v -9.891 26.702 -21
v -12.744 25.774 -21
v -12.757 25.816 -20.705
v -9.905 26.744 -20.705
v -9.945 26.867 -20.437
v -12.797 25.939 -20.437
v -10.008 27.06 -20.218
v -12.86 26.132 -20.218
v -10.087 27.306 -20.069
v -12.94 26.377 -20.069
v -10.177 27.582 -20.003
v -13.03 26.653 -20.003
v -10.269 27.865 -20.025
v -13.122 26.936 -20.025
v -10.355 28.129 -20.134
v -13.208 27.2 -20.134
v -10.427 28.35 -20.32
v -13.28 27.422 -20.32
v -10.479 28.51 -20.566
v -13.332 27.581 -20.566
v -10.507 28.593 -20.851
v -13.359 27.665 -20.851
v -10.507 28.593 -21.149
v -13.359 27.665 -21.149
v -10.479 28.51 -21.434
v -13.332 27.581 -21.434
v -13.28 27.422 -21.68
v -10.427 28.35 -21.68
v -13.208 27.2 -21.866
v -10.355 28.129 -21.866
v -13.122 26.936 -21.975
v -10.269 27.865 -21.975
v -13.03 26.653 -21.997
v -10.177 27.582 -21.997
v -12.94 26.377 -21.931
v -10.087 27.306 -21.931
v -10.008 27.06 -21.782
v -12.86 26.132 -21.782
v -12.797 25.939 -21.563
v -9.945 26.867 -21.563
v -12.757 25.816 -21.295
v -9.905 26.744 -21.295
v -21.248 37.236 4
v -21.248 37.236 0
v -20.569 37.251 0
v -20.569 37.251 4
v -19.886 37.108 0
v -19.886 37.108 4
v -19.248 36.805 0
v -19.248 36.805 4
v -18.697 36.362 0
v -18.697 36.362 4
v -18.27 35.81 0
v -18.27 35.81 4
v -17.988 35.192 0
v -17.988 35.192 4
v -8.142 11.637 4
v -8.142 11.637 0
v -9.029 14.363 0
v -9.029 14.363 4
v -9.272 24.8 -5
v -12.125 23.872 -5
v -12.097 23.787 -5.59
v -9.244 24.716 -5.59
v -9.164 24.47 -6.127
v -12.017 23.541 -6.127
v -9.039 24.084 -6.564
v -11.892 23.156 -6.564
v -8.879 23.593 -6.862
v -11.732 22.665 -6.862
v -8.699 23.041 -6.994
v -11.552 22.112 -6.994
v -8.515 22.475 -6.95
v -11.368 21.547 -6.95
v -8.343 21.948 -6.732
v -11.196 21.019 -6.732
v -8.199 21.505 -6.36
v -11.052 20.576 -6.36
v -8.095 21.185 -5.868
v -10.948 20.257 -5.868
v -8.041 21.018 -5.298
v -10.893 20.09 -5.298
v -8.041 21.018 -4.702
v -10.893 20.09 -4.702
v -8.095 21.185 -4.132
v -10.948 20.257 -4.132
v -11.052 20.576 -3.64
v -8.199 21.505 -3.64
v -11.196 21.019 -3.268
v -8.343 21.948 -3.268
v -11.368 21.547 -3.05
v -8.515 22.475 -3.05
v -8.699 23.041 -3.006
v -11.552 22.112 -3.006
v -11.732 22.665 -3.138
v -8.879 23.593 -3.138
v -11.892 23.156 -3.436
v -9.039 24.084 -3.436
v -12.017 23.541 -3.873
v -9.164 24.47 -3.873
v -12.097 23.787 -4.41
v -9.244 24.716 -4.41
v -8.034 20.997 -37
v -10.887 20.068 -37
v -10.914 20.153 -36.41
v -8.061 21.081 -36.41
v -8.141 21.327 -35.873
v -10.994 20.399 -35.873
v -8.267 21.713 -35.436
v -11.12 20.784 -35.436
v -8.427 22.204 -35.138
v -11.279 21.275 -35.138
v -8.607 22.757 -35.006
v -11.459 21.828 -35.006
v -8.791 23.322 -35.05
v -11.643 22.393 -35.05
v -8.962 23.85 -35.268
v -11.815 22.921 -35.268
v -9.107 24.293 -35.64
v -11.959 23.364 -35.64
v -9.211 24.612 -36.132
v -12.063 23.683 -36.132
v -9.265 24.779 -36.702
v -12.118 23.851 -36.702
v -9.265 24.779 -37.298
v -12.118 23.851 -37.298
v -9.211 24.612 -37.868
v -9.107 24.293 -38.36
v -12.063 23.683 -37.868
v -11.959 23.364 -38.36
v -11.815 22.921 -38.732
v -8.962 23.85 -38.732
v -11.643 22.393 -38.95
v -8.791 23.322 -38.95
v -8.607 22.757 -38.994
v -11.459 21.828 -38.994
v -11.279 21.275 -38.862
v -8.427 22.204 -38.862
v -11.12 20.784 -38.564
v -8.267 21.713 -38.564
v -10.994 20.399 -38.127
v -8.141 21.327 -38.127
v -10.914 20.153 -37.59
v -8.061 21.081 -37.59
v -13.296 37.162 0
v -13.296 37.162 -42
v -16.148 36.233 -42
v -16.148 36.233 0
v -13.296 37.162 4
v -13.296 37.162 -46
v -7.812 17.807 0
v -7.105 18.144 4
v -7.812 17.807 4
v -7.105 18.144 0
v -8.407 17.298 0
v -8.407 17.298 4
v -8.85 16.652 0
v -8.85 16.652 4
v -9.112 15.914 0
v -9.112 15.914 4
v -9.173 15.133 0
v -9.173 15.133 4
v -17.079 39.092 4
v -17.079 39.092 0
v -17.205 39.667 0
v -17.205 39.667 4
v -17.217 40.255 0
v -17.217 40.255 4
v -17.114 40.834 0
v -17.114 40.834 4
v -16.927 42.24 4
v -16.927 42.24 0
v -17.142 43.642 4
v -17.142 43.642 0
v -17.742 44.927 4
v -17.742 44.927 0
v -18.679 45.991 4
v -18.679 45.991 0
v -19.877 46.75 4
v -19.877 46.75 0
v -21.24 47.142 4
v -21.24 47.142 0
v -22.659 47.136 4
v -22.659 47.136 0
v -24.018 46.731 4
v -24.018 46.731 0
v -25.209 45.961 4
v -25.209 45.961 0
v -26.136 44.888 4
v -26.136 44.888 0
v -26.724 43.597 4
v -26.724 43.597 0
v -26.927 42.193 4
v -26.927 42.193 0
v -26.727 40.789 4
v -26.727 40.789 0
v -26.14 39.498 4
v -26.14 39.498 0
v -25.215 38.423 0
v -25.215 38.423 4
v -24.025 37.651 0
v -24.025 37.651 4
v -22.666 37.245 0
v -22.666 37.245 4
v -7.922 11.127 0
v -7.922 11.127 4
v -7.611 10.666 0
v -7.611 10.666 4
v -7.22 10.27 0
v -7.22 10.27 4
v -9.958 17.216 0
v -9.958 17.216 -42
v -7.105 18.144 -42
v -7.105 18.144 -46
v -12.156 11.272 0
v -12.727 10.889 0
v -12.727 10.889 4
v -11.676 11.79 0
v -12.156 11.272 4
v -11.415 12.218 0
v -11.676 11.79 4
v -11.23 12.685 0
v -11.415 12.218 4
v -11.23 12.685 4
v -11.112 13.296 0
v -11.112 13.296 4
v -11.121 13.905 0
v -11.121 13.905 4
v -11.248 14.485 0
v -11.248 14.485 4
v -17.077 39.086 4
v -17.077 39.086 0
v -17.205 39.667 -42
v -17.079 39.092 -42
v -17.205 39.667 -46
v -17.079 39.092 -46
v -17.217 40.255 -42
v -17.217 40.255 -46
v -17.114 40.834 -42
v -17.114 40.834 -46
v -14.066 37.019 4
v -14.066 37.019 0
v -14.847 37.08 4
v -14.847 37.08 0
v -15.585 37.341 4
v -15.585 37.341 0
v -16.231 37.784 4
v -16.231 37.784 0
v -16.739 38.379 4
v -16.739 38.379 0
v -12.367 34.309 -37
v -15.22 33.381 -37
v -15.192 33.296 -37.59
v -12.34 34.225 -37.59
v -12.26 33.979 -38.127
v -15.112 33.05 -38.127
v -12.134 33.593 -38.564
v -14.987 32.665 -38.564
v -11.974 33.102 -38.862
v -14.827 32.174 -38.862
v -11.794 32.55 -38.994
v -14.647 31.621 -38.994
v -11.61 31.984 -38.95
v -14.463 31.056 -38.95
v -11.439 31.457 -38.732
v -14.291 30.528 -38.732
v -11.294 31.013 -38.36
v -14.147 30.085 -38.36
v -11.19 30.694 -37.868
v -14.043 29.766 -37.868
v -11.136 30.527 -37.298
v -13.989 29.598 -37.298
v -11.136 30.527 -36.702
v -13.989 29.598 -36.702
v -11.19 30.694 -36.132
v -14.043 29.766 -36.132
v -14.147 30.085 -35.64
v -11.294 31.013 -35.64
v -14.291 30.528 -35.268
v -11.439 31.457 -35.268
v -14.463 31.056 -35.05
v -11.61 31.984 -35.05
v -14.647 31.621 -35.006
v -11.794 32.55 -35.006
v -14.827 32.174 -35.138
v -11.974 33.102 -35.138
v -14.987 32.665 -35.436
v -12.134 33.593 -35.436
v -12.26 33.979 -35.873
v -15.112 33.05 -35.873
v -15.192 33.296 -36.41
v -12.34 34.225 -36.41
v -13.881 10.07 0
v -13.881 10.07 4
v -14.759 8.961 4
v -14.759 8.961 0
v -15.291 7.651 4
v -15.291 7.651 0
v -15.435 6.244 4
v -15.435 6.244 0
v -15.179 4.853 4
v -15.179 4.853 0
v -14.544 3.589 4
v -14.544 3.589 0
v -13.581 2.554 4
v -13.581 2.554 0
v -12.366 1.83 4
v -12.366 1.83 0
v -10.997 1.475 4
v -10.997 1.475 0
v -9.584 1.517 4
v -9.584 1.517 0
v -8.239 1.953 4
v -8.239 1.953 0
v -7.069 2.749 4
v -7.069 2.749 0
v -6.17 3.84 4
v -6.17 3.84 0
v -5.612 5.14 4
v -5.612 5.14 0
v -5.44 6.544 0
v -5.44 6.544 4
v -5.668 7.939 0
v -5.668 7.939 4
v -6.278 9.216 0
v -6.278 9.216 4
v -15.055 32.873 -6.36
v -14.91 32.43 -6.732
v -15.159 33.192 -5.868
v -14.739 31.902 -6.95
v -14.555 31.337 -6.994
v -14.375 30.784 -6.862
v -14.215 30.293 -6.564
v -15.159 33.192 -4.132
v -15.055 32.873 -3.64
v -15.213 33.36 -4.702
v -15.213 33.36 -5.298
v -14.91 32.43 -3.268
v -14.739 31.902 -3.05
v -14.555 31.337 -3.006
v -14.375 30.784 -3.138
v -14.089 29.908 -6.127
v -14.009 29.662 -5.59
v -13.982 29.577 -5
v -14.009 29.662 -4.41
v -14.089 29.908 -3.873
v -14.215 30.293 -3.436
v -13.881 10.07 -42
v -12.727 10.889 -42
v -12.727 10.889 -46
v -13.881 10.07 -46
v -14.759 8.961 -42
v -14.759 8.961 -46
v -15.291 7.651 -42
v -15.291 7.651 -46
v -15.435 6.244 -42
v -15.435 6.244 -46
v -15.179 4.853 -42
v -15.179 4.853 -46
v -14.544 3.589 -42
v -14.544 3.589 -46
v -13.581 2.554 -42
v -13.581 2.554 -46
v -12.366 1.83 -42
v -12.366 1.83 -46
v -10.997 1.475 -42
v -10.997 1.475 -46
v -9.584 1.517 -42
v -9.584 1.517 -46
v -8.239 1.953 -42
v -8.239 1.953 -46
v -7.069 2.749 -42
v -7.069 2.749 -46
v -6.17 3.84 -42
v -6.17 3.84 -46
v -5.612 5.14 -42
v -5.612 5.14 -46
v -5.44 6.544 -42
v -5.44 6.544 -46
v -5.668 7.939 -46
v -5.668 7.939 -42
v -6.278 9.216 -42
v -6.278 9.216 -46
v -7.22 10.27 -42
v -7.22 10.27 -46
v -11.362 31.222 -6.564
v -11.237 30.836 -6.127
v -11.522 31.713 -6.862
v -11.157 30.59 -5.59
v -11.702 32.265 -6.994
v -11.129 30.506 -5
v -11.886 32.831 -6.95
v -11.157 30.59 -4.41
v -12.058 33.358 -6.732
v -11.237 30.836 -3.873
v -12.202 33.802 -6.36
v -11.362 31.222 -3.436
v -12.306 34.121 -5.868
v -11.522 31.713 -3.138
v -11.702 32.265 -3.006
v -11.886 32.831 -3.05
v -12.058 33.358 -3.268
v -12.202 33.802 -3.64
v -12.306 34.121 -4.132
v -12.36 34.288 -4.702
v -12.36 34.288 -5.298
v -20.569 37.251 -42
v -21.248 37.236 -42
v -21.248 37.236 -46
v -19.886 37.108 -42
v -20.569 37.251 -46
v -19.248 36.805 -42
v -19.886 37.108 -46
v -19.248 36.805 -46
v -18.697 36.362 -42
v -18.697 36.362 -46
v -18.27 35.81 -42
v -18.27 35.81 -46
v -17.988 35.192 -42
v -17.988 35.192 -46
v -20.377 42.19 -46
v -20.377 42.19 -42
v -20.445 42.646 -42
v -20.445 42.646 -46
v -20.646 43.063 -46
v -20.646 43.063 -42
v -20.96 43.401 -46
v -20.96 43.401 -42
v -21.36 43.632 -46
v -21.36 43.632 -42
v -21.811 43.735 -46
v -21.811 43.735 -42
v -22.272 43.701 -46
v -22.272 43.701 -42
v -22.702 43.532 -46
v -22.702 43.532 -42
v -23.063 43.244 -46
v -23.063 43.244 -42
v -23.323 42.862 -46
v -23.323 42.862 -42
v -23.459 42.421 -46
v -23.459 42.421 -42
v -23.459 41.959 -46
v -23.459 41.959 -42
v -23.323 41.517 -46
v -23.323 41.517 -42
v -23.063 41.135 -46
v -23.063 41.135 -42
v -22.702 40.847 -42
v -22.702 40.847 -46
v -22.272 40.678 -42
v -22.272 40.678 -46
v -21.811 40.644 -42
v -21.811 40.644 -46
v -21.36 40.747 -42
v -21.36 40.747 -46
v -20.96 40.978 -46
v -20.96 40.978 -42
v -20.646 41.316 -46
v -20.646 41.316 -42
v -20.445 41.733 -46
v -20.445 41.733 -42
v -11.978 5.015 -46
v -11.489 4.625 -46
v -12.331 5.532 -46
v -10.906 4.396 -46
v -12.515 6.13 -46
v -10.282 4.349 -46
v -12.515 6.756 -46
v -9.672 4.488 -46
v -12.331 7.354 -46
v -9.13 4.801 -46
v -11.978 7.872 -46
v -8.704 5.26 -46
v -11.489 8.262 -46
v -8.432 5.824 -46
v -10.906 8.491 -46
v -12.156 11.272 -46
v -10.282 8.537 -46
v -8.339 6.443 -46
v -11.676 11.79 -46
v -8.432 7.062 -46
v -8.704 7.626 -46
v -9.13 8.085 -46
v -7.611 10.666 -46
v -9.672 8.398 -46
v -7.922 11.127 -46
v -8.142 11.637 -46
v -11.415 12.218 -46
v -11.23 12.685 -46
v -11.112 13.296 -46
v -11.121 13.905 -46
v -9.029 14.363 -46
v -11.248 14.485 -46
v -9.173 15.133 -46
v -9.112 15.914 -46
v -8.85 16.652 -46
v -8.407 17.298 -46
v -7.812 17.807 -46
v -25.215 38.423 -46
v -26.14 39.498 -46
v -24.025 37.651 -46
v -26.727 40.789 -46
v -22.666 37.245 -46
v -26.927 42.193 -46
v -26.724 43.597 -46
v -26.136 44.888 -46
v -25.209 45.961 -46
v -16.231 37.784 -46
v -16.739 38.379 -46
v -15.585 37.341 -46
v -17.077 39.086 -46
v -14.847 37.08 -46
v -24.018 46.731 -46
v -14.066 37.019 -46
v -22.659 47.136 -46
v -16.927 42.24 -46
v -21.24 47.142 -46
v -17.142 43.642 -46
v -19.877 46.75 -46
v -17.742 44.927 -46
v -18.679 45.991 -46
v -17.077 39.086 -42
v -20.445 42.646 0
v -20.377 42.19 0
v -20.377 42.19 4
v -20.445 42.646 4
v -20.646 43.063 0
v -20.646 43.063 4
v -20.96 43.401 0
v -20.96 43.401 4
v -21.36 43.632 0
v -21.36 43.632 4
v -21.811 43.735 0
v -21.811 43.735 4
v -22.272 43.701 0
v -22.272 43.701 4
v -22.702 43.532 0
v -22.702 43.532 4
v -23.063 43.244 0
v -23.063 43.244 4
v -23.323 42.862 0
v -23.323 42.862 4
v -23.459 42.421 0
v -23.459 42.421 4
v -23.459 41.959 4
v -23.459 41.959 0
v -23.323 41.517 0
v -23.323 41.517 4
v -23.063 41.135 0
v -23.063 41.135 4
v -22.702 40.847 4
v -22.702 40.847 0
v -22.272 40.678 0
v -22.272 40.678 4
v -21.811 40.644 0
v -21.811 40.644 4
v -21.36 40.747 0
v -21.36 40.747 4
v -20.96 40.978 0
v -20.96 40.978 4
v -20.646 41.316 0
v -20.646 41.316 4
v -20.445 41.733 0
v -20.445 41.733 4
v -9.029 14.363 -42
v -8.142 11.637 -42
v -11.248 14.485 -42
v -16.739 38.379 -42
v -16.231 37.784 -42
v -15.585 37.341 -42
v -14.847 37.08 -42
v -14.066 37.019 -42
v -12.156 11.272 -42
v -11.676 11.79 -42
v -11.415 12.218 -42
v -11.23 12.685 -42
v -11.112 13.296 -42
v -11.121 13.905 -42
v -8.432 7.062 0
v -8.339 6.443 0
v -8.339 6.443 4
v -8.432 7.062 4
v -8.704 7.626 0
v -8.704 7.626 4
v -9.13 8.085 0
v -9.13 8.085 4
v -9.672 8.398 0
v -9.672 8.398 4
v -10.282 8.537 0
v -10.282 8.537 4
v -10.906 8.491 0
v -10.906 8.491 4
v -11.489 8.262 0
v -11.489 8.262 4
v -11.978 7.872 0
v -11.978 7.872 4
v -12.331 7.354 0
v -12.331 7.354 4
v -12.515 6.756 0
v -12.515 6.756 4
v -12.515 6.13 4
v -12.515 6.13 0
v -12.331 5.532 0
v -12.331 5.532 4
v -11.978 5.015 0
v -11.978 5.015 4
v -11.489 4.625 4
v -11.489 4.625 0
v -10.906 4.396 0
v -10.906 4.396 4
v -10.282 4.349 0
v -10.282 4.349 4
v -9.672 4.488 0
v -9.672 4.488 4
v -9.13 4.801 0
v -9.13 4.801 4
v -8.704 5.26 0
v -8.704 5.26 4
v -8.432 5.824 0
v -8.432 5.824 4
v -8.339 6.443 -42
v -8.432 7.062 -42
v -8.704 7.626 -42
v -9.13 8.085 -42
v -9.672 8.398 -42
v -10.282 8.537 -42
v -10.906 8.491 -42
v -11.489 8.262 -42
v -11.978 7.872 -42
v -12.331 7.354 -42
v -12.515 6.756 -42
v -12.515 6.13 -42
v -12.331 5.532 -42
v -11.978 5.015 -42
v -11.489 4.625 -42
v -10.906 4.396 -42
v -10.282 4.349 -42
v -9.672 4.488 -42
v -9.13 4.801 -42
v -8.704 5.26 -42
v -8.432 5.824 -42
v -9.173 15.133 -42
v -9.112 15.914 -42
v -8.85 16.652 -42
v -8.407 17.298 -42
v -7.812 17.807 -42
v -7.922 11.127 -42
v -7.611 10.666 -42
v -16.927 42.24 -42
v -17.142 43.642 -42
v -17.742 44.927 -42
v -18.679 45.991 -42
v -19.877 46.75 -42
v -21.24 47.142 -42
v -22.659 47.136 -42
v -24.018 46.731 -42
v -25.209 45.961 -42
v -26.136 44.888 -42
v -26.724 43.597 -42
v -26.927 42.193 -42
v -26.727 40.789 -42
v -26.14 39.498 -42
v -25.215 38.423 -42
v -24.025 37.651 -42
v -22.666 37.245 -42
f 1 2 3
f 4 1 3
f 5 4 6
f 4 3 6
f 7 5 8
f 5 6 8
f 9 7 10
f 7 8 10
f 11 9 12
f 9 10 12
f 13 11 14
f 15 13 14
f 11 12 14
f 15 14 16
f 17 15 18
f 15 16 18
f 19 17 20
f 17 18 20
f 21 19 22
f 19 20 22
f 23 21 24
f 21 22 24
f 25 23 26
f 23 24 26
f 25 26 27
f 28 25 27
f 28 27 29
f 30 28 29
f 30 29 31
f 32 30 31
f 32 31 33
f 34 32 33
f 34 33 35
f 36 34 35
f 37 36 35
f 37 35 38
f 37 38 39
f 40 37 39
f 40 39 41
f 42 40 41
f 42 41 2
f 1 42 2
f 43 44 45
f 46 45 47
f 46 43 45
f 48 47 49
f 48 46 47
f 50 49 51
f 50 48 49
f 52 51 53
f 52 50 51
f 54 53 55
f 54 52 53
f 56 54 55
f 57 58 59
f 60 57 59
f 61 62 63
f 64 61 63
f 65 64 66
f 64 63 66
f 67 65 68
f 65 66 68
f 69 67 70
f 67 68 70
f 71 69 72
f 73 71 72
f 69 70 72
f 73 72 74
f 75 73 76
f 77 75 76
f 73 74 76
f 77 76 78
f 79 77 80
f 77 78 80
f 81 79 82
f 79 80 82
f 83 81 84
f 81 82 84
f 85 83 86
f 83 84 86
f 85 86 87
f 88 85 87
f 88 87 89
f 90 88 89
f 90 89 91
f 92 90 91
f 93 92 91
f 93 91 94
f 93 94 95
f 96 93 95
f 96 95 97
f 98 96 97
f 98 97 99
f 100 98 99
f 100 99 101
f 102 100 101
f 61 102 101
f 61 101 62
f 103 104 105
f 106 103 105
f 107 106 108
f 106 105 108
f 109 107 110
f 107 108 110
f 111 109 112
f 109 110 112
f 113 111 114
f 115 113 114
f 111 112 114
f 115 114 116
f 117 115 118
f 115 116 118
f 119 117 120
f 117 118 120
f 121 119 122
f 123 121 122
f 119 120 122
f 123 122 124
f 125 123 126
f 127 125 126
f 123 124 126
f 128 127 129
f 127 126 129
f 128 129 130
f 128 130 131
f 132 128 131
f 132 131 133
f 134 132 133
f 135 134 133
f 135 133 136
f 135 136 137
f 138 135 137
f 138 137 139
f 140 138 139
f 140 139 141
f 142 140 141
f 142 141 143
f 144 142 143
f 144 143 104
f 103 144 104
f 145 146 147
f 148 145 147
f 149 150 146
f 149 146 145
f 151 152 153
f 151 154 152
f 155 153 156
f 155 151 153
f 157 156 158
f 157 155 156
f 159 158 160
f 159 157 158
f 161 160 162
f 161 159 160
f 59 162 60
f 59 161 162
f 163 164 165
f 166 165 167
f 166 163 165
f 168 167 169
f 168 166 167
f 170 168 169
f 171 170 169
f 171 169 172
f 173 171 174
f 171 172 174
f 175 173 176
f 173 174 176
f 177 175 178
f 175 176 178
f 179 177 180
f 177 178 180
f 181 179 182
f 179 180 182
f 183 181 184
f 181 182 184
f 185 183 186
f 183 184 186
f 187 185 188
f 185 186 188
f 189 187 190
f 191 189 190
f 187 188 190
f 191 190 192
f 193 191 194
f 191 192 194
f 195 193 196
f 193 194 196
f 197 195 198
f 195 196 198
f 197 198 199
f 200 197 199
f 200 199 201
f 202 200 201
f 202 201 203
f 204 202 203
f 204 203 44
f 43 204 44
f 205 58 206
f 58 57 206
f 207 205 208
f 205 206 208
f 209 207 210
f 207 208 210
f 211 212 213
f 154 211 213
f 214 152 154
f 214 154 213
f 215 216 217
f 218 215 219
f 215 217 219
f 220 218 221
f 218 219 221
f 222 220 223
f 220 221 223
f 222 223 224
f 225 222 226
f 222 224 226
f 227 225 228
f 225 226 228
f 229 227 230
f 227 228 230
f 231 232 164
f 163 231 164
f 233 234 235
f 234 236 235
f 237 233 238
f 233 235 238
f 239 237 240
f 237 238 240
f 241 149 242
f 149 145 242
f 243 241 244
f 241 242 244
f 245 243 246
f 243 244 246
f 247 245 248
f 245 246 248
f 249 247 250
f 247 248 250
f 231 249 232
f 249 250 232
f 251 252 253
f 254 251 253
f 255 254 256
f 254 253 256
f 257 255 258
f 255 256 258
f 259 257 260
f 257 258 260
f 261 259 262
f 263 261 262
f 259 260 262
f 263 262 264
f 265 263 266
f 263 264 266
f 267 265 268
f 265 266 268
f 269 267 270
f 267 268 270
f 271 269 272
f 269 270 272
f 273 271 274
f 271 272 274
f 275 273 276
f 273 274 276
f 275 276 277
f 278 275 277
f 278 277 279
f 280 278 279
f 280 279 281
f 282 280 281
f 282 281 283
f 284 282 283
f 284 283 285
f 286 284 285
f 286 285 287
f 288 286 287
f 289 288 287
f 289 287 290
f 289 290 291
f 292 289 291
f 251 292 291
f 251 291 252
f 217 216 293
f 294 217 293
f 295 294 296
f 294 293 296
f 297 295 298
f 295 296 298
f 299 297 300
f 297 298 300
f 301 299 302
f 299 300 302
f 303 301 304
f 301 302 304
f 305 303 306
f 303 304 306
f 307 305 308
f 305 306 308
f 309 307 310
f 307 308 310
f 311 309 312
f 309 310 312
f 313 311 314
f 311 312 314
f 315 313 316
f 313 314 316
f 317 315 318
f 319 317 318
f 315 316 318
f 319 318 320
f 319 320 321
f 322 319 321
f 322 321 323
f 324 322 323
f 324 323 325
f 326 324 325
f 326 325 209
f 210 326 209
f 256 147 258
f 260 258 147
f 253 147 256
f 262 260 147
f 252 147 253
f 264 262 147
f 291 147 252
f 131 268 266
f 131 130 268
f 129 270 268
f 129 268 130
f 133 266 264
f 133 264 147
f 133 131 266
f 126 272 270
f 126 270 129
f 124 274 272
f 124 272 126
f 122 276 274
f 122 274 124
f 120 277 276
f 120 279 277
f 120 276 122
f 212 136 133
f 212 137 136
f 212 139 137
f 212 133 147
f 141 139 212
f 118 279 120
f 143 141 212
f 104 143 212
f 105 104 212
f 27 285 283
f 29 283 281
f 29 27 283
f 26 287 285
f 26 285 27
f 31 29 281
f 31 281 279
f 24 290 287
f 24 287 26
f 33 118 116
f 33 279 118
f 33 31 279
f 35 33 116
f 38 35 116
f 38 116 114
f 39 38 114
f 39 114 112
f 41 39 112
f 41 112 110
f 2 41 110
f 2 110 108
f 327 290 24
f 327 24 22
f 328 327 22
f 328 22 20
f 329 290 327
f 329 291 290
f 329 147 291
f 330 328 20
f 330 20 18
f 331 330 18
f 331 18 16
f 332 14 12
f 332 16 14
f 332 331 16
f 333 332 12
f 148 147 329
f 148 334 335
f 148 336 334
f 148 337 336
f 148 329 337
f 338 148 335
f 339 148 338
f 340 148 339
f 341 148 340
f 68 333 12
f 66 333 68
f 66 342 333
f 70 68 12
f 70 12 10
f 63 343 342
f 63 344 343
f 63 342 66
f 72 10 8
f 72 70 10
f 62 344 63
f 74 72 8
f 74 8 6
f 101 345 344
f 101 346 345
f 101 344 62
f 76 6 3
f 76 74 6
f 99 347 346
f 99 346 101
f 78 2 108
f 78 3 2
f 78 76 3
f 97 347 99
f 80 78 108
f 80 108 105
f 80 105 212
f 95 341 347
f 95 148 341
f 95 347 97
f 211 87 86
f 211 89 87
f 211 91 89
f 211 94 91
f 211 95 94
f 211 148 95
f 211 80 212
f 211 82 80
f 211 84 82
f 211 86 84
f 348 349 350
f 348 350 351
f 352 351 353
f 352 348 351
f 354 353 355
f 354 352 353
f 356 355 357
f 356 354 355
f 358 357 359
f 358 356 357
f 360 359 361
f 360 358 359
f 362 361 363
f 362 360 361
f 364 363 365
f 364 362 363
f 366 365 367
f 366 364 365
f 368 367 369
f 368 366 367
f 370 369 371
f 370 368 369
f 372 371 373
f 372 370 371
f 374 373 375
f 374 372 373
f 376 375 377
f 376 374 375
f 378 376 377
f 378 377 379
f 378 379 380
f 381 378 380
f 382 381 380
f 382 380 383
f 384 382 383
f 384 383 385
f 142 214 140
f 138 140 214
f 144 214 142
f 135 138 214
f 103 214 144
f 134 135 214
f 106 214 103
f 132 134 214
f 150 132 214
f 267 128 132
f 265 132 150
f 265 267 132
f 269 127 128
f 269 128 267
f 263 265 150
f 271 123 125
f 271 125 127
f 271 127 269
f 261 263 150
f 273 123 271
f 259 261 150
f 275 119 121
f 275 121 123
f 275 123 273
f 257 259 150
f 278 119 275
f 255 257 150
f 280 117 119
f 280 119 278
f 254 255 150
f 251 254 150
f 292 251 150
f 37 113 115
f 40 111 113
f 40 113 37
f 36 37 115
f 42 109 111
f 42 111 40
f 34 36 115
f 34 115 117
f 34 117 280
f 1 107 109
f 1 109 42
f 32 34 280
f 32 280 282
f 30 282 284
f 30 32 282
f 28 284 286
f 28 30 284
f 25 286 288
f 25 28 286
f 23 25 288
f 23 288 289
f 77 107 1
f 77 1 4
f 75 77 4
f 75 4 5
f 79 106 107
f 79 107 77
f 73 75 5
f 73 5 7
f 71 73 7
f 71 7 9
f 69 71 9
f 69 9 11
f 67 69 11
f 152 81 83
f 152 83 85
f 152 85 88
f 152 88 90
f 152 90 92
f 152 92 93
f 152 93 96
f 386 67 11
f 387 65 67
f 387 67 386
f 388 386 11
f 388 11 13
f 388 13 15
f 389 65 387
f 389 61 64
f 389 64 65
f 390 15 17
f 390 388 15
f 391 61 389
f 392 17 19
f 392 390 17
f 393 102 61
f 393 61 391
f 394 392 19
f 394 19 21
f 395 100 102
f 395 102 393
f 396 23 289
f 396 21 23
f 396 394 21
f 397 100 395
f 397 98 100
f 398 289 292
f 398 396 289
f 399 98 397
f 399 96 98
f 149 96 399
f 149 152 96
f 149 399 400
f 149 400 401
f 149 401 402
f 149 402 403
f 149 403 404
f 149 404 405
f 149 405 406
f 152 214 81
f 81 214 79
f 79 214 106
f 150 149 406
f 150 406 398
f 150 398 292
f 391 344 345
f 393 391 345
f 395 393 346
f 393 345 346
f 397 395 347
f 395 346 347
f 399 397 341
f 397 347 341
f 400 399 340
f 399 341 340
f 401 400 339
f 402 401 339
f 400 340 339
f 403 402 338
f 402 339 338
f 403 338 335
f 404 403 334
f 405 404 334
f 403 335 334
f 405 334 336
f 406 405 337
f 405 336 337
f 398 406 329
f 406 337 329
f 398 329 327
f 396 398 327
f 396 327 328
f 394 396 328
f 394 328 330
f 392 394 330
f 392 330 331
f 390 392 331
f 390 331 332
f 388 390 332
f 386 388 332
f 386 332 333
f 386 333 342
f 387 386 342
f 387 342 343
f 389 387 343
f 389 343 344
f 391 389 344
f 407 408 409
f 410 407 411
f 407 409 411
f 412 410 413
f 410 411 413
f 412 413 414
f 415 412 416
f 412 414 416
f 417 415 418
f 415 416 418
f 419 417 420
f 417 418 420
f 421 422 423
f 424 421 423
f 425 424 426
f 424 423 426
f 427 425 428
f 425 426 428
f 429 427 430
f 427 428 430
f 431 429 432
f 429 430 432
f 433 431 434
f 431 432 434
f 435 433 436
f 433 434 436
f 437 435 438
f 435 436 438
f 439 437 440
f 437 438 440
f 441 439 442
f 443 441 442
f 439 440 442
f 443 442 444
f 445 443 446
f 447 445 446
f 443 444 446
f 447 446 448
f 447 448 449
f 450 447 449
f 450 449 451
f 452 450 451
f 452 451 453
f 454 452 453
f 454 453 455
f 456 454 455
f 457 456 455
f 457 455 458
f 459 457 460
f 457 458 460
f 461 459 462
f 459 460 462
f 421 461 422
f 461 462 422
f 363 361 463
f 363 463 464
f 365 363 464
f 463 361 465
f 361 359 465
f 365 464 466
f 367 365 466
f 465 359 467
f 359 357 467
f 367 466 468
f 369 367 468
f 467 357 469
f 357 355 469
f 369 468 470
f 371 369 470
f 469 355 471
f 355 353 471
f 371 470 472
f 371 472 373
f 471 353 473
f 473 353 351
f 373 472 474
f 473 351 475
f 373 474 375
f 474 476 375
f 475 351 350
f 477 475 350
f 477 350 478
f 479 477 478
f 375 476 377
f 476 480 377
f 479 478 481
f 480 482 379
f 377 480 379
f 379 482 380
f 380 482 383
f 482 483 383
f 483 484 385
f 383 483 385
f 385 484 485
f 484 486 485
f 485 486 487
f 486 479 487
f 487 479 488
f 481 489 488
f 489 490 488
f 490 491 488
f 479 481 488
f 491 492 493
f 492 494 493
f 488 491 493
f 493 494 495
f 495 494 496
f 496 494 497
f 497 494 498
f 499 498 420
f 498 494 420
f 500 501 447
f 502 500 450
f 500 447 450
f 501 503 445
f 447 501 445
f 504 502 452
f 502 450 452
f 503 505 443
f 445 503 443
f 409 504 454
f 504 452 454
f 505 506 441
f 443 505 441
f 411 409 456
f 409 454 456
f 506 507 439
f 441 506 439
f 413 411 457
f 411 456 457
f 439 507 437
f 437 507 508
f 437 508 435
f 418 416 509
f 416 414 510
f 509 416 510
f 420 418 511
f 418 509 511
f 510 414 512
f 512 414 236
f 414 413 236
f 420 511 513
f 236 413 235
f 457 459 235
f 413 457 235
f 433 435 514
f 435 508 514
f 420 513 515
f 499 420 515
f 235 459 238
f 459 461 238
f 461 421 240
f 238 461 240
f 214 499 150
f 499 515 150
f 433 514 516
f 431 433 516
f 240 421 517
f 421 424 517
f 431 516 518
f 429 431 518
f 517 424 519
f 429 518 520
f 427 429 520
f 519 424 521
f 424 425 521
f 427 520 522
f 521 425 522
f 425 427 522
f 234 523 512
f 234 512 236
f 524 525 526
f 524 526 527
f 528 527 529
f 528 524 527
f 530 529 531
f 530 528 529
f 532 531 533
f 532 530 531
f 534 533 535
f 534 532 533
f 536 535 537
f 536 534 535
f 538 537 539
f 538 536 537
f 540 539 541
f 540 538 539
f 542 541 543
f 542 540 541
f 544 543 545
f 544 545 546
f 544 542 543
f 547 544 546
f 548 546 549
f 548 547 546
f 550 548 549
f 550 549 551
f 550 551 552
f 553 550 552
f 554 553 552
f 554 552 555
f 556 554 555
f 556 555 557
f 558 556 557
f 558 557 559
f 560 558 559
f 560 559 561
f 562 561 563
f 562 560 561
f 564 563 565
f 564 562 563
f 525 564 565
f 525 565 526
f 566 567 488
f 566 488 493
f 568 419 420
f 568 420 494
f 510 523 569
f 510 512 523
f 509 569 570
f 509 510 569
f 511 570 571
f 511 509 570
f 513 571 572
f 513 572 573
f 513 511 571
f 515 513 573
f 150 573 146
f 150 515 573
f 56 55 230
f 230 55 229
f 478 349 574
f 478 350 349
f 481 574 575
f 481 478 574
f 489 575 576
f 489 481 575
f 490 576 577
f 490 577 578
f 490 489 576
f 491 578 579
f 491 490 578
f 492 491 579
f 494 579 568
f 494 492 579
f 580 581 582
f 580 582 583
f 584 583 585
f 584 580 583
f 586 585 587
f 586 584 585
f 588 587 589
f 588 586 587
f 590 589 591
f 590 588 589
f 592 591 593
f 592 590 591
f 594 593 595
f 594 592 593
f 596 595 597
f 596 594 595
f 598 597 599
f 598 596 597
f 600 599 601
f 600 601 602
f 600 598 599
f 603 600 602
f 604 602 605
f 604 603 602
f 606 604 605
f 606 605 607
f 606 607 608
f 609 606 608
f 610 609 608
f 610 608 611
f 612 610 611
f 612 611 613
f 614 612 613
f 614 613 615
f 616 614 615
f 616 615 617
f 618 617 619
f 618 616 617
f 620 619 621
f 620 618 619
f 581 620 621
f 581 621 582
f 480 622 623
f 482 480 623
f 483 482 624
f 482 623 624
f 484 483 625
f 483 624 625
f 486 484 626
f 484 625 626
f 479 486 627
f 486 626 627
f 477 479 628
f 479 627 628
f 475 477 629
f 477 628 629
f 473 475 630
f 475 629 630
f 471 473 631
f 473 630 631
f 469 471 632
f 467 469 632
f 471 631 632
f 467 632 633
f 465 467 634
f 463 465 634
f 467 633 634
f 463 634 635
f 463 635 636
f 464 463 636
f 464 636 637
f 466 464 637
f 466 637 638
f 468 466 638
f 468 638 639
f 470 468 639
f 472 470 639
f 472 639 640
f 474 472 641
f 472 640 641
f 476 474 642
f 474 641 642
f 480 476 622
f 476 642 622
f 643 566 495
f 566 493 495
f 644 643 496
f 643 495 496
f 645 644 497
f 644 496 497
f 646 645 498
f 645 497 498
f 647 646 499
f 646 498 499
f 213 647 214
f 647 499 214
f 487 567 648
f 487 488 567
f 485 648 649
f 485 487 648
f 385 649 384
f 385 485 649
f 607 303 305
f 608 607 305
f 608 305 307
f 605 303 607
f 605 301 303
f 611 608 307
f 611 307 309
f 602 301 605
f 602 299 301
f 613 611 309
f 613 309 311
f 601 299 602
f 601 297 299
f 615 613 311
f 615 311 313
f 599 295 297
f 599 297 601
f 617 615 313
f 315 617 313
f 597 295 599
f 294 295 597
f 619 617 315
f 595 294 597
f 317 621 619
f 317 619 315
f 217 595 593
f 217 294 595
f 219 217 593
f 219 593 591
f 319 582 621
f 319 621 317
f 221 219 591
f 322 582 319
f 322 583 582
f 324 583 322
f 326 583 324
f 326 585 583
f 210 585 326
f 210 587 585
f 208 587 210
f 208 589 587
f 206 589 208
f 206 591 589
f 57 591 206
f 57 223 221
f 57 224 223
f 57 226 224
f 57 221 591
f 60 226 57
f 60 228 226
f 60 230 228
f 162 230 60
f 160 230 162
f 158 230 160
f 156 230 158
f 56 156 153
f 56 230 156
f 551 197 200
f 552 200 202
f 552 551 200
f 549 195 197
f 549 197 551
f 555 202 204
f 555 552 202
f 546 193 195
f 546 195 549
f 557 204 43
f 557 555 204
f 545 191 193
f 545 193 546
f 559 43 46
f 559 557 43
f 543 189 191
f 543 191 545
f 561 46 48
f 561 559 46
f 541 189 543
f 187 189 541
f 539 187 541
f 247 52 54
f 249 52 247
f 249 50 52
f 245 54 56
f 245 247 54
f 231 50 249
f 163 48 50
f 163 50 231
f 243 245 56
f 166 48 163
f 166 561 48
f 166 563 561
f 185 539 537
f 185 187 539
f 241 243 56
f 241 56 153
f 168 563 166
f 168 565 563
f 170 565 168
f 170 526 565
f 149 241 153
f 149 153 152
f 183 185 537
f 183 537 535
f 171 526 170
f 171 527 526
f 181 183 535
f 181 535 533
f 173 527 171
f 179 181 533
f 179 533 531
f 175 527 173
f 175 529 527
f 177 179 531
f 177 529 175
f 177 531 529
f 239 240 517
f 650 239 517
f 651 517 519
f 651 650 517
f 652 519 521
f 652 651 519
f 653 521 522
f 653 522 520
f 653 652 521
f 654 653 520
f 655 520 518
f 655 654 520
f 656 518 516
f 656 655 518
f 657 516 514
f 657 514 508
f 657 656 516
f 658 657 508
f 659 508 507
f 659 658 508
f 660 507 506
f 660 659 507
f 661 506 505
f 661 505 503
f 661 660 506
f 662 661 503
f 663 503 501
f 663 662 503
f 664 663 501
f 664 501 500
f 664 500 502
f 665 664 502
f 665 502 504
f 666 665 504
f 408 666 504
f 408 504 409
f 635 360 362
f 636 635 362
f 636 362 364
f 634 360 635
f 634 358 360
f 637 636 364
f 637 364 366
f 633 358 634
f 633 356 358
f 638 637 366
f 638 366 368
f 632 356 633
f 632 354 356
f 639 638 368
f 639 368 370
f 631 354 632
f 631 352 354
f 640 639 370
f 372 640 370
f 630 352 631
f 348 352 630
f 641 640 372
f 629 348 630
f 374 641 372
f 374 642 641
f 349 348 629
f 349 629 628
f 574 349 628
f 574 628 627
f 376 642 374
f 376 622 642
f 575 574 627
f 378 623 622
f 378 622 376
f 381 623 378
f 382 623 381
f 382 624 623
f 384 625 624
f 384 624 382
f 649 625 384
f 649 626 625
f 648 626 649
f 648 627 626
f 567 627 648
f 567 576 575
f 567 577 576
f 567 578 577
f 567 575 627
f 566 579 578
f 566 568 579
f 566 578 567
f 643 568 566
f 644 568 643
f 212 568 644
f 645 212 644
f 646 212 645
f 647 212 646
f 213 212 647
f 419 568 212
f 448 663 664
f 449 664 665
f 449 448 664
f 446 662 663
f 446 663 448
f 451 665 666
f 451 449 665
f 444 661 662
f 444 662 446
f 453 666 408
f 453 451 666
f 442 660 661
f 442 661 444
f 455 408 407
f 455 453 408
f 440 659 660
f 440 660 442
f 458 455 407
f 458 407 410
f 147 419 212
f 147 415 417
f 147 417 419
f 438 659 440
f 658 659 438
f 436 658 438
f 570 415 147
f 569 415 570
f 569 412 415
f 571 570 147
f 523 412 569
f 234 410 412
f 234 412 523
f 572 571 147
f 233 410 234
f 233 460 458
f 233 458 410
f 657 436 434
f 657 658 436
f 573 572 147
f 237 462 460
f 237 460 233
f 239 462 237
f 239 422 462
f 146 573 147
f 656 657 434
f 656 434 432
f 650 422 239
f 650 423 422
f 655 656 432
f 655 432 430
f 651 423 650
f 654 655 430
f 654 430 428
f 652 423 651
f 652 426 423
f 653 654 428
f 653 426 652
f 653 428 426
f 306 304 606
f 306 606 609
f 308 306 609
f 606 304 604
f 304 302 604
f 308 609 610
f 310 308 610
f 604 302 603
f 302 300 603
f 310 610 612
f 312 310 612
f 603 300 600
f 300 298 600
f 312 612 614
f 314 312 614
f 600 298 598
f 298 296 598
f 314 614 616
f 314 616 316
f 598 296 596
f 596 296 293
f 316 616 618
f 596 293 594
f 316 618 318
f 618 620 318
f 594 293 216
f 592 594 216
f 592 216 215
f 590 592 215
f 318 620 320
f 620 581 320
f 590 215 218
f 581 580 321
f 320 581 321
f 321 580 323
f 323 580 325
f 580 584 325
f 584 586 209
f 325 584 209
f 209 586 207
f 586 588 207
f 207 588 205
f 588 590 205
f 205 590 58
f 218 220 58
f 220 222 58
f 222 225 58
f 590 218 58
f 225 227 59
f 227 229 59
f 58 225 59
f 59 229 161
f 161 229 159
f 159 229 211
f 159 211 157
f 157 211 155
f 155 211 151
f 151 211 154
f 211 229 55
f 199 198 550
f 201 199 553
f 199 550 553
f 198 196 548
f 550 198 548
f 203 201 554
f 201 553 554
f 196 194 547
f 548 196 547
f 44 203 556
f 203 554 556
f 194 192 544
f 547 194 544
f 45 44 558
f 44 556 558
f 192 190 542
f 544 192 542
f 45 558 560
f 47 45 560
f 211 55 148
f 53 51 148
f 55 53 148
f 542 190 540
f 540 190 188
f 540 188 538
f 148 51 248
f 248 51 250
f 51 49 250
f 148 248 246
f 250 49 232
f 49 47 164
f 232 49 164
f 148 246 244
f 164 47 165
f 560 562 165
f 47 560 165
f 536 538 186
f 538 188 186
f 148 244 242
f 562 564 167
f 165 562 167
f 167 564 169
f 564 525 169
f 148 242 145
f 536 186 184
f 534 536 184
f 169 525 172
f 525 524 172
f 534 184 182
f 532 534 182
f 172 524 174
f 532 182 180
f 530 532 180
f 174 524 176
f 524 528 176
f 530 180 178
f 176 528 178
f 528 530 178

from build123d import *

# Parameters (mm, degrees)
SKETCH1_R           = 2.1
SKETCH1_R_2         = 1.55
BOSS_EXTRUDE1_DEPTH = 4
BOSS_EXTRUDE2_DEPTH = 50
SKETCH3_R           = 2
SKETCH3_R_2         = 1
CUT_EXTRUDE1_DEPTH  = 10
FILLET1_R           = 3


with BuildPart() as part:
    # Sketch1 → Boss-Extrude1 (new body)
    with BuildSketch(Plane.XY):
        with BuildLine():
            Line((-7.842362425, 10.716234493), (-17.397624454, 40.071064625))
            ThreePointArc((-17.397624454, 40.071064625), (-25.795005306, 45.357497095), (-18.956793202, 38.167140452))
            Line((-18.956793202, 38.167140452), (-18.754238897, 37.544871045))
            Line((-18.754238897, 37.544871045), (-10.63810017, 12.611188123))
            Line((-10.63810017, 12.611188123), (-10.256851829, 11.439950722))
            ThreePointArc((-10.256851829, 11.439950722), (-11.874437039, 1.653788416), (-7.842362425, 10.716234493))
        make_face()
        with Locations((-10.438845238, 6.44326398)):
            Circle(SKETCH1_R, mode=Mode.SUBTRACT)
        with Locations((-21.926625837, 42.189589224)):
            Circle(SKETCH1_R_2, mode=Mode.SUBTRACT)
    boss_extrude1 = extrude(amount=BOSS_EXTRUDE1_DEPTH)

    # Sketch2 → Boss-Extrude2 (add)
    with BuildSketch(Plane.XY.offset(4)):
        Polygon((-16.14843876, 36.233426921), (-9.957962302, 17.215593153), (-7.105287237, 18.144164622), (-13.295763695, 37.161998389), align=None)
    extrude(amount=-BOSS_EXTRUDE2_DEPTH)

    # Mirror1: Boss-Extrude1 across plane
    add(boss_extrude1.mirror(Plane.XY.offset(-21)))

    # Sketch3 → Cut-Extrude1 (cut)
    with BuildSketch(Plane(origin=(-3.936983875, -1.281523768, 0), x_dir=(0, 0, 1), z_dir=(-0.950891688393093, -0.30952382290371966, 0))):
        with Locations(Location((-5, 34.452391, 0), (0, 0, 270))):
            Circle(SKETCH3_R)
        with Locations(Location((-5, 24.452391, 0), (0, 0, 90))):
            Circle(SKETCH3_R)
        with Locations(Location((-37, 24.452391, 0), (0, 0, 270))):
            Circle(SKETCH3_R)
        with Locations(Location((-37, 34.452391, 0), (0, 0, 90))):
            Circle(SKETCH3_R)
        with Locations(Location((-21, 29.452391, 0), (0, 0, 270))):
            Circle(SKETCH3_R_2)
    extrude(amount=-CUT_EXTRUDE1_DEPTH, mode=Mode.SUBTRACT)

    # Fillet1
    fillet1_edges = [part.edges().sort_by_distance(p)[0] for p in [
        (-9.957962302, 17.215593153, 2),
        (-9.957962302, 17.215593153, -44),
        (-16.14843876, 36.233426921, -44),
        (-16.14843876, 36.233426921, 2),
        (-10.256851829, 11.439950722, 2),
        (-7.842362425, 10.716234493, 2),
        (-7.842362425, 10.716234493, -44),
        (-10.256851829, 11.439950722, -44),
        (-17.397624454, 40.071064625, -44),
        (-18.956793202, 38.167140452, -44),
        (-17.397624454, 40.071064625, 2),
        (-18.956793202, 38.167140452, 2),
    ]]
    fillet(fillet1_edges, radius=FILLET1_R - 0.0001)  # a hair under: the kernel refuses the full size


solid = part.part
